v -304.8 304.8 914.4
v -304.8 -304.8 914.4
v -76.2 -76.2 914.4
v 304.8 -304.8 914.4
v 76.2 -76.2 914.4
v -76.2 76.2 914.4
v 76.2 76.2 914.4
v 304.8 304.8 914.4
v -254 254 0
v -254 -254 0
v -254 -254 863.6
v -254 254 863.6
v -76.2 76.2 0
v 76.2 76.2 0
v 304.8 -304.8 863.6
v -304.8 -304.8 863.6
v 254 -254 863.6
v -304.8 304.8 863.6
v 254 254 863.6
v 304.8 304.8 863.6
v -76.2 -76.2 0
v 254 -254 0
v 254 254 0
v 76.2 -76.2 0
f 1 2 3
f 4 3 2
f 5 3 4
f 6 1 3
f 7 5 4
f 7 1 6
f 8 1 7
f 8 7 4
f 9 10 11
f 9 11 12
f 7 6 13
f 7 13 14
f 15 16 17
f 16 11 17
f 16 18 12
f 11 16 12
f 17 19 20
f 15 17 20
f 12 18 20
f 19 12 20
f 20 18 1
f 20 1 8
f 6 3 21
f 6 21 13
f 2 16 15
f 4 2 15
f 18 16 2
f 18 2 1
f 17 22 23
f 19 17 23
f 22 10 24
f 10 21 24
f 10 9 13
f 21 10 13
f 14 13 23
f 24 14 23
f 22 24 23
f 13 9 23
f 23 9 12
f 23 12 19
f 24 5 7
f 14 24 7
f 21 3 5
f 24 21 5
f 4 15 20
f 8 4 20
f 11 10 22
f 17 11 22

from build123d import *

# Parameters (mm, degrees)
F0_W     = 508
F0_H     = 508
F0_W_2   = 152.4
F0_H_2   = 152.4
F1_DEPTH = 863.6
F2_W     = 609.6
F2_H     = 609.6
F3_DEPTH = 50.8
F4_W     = 152.4
F4_H     = 152.4
F5_DEPTH = 254


with BuildPart() as f1:
    # F0 (on Top) → F1 (new body)
    with BuildSketch(Plane.XY):
        Rectangle(F0_W, F0_H)
        Rectangle(F0_W_2, F0_H_2, mode=Mode.SUBTRACT)
    extrude(amount=F1_DEPTH)

    # F2 (on face) → F3 (join)
    with BuildSketch(Plane.XY.offset(863.6)):
        Rectangle(F2_W, F2_H)
    extrude(amount=F3_DEPTH)

    # F4 (on face) → F5 (cut)
    with BuildSketch(Plane.XY.offset(914.4)):
        Rectangle(F4_W, F4_H)
    extrude(amount=-F5_DEPTH, mode=Mode.SUBTRACT)


solid = f1.part
